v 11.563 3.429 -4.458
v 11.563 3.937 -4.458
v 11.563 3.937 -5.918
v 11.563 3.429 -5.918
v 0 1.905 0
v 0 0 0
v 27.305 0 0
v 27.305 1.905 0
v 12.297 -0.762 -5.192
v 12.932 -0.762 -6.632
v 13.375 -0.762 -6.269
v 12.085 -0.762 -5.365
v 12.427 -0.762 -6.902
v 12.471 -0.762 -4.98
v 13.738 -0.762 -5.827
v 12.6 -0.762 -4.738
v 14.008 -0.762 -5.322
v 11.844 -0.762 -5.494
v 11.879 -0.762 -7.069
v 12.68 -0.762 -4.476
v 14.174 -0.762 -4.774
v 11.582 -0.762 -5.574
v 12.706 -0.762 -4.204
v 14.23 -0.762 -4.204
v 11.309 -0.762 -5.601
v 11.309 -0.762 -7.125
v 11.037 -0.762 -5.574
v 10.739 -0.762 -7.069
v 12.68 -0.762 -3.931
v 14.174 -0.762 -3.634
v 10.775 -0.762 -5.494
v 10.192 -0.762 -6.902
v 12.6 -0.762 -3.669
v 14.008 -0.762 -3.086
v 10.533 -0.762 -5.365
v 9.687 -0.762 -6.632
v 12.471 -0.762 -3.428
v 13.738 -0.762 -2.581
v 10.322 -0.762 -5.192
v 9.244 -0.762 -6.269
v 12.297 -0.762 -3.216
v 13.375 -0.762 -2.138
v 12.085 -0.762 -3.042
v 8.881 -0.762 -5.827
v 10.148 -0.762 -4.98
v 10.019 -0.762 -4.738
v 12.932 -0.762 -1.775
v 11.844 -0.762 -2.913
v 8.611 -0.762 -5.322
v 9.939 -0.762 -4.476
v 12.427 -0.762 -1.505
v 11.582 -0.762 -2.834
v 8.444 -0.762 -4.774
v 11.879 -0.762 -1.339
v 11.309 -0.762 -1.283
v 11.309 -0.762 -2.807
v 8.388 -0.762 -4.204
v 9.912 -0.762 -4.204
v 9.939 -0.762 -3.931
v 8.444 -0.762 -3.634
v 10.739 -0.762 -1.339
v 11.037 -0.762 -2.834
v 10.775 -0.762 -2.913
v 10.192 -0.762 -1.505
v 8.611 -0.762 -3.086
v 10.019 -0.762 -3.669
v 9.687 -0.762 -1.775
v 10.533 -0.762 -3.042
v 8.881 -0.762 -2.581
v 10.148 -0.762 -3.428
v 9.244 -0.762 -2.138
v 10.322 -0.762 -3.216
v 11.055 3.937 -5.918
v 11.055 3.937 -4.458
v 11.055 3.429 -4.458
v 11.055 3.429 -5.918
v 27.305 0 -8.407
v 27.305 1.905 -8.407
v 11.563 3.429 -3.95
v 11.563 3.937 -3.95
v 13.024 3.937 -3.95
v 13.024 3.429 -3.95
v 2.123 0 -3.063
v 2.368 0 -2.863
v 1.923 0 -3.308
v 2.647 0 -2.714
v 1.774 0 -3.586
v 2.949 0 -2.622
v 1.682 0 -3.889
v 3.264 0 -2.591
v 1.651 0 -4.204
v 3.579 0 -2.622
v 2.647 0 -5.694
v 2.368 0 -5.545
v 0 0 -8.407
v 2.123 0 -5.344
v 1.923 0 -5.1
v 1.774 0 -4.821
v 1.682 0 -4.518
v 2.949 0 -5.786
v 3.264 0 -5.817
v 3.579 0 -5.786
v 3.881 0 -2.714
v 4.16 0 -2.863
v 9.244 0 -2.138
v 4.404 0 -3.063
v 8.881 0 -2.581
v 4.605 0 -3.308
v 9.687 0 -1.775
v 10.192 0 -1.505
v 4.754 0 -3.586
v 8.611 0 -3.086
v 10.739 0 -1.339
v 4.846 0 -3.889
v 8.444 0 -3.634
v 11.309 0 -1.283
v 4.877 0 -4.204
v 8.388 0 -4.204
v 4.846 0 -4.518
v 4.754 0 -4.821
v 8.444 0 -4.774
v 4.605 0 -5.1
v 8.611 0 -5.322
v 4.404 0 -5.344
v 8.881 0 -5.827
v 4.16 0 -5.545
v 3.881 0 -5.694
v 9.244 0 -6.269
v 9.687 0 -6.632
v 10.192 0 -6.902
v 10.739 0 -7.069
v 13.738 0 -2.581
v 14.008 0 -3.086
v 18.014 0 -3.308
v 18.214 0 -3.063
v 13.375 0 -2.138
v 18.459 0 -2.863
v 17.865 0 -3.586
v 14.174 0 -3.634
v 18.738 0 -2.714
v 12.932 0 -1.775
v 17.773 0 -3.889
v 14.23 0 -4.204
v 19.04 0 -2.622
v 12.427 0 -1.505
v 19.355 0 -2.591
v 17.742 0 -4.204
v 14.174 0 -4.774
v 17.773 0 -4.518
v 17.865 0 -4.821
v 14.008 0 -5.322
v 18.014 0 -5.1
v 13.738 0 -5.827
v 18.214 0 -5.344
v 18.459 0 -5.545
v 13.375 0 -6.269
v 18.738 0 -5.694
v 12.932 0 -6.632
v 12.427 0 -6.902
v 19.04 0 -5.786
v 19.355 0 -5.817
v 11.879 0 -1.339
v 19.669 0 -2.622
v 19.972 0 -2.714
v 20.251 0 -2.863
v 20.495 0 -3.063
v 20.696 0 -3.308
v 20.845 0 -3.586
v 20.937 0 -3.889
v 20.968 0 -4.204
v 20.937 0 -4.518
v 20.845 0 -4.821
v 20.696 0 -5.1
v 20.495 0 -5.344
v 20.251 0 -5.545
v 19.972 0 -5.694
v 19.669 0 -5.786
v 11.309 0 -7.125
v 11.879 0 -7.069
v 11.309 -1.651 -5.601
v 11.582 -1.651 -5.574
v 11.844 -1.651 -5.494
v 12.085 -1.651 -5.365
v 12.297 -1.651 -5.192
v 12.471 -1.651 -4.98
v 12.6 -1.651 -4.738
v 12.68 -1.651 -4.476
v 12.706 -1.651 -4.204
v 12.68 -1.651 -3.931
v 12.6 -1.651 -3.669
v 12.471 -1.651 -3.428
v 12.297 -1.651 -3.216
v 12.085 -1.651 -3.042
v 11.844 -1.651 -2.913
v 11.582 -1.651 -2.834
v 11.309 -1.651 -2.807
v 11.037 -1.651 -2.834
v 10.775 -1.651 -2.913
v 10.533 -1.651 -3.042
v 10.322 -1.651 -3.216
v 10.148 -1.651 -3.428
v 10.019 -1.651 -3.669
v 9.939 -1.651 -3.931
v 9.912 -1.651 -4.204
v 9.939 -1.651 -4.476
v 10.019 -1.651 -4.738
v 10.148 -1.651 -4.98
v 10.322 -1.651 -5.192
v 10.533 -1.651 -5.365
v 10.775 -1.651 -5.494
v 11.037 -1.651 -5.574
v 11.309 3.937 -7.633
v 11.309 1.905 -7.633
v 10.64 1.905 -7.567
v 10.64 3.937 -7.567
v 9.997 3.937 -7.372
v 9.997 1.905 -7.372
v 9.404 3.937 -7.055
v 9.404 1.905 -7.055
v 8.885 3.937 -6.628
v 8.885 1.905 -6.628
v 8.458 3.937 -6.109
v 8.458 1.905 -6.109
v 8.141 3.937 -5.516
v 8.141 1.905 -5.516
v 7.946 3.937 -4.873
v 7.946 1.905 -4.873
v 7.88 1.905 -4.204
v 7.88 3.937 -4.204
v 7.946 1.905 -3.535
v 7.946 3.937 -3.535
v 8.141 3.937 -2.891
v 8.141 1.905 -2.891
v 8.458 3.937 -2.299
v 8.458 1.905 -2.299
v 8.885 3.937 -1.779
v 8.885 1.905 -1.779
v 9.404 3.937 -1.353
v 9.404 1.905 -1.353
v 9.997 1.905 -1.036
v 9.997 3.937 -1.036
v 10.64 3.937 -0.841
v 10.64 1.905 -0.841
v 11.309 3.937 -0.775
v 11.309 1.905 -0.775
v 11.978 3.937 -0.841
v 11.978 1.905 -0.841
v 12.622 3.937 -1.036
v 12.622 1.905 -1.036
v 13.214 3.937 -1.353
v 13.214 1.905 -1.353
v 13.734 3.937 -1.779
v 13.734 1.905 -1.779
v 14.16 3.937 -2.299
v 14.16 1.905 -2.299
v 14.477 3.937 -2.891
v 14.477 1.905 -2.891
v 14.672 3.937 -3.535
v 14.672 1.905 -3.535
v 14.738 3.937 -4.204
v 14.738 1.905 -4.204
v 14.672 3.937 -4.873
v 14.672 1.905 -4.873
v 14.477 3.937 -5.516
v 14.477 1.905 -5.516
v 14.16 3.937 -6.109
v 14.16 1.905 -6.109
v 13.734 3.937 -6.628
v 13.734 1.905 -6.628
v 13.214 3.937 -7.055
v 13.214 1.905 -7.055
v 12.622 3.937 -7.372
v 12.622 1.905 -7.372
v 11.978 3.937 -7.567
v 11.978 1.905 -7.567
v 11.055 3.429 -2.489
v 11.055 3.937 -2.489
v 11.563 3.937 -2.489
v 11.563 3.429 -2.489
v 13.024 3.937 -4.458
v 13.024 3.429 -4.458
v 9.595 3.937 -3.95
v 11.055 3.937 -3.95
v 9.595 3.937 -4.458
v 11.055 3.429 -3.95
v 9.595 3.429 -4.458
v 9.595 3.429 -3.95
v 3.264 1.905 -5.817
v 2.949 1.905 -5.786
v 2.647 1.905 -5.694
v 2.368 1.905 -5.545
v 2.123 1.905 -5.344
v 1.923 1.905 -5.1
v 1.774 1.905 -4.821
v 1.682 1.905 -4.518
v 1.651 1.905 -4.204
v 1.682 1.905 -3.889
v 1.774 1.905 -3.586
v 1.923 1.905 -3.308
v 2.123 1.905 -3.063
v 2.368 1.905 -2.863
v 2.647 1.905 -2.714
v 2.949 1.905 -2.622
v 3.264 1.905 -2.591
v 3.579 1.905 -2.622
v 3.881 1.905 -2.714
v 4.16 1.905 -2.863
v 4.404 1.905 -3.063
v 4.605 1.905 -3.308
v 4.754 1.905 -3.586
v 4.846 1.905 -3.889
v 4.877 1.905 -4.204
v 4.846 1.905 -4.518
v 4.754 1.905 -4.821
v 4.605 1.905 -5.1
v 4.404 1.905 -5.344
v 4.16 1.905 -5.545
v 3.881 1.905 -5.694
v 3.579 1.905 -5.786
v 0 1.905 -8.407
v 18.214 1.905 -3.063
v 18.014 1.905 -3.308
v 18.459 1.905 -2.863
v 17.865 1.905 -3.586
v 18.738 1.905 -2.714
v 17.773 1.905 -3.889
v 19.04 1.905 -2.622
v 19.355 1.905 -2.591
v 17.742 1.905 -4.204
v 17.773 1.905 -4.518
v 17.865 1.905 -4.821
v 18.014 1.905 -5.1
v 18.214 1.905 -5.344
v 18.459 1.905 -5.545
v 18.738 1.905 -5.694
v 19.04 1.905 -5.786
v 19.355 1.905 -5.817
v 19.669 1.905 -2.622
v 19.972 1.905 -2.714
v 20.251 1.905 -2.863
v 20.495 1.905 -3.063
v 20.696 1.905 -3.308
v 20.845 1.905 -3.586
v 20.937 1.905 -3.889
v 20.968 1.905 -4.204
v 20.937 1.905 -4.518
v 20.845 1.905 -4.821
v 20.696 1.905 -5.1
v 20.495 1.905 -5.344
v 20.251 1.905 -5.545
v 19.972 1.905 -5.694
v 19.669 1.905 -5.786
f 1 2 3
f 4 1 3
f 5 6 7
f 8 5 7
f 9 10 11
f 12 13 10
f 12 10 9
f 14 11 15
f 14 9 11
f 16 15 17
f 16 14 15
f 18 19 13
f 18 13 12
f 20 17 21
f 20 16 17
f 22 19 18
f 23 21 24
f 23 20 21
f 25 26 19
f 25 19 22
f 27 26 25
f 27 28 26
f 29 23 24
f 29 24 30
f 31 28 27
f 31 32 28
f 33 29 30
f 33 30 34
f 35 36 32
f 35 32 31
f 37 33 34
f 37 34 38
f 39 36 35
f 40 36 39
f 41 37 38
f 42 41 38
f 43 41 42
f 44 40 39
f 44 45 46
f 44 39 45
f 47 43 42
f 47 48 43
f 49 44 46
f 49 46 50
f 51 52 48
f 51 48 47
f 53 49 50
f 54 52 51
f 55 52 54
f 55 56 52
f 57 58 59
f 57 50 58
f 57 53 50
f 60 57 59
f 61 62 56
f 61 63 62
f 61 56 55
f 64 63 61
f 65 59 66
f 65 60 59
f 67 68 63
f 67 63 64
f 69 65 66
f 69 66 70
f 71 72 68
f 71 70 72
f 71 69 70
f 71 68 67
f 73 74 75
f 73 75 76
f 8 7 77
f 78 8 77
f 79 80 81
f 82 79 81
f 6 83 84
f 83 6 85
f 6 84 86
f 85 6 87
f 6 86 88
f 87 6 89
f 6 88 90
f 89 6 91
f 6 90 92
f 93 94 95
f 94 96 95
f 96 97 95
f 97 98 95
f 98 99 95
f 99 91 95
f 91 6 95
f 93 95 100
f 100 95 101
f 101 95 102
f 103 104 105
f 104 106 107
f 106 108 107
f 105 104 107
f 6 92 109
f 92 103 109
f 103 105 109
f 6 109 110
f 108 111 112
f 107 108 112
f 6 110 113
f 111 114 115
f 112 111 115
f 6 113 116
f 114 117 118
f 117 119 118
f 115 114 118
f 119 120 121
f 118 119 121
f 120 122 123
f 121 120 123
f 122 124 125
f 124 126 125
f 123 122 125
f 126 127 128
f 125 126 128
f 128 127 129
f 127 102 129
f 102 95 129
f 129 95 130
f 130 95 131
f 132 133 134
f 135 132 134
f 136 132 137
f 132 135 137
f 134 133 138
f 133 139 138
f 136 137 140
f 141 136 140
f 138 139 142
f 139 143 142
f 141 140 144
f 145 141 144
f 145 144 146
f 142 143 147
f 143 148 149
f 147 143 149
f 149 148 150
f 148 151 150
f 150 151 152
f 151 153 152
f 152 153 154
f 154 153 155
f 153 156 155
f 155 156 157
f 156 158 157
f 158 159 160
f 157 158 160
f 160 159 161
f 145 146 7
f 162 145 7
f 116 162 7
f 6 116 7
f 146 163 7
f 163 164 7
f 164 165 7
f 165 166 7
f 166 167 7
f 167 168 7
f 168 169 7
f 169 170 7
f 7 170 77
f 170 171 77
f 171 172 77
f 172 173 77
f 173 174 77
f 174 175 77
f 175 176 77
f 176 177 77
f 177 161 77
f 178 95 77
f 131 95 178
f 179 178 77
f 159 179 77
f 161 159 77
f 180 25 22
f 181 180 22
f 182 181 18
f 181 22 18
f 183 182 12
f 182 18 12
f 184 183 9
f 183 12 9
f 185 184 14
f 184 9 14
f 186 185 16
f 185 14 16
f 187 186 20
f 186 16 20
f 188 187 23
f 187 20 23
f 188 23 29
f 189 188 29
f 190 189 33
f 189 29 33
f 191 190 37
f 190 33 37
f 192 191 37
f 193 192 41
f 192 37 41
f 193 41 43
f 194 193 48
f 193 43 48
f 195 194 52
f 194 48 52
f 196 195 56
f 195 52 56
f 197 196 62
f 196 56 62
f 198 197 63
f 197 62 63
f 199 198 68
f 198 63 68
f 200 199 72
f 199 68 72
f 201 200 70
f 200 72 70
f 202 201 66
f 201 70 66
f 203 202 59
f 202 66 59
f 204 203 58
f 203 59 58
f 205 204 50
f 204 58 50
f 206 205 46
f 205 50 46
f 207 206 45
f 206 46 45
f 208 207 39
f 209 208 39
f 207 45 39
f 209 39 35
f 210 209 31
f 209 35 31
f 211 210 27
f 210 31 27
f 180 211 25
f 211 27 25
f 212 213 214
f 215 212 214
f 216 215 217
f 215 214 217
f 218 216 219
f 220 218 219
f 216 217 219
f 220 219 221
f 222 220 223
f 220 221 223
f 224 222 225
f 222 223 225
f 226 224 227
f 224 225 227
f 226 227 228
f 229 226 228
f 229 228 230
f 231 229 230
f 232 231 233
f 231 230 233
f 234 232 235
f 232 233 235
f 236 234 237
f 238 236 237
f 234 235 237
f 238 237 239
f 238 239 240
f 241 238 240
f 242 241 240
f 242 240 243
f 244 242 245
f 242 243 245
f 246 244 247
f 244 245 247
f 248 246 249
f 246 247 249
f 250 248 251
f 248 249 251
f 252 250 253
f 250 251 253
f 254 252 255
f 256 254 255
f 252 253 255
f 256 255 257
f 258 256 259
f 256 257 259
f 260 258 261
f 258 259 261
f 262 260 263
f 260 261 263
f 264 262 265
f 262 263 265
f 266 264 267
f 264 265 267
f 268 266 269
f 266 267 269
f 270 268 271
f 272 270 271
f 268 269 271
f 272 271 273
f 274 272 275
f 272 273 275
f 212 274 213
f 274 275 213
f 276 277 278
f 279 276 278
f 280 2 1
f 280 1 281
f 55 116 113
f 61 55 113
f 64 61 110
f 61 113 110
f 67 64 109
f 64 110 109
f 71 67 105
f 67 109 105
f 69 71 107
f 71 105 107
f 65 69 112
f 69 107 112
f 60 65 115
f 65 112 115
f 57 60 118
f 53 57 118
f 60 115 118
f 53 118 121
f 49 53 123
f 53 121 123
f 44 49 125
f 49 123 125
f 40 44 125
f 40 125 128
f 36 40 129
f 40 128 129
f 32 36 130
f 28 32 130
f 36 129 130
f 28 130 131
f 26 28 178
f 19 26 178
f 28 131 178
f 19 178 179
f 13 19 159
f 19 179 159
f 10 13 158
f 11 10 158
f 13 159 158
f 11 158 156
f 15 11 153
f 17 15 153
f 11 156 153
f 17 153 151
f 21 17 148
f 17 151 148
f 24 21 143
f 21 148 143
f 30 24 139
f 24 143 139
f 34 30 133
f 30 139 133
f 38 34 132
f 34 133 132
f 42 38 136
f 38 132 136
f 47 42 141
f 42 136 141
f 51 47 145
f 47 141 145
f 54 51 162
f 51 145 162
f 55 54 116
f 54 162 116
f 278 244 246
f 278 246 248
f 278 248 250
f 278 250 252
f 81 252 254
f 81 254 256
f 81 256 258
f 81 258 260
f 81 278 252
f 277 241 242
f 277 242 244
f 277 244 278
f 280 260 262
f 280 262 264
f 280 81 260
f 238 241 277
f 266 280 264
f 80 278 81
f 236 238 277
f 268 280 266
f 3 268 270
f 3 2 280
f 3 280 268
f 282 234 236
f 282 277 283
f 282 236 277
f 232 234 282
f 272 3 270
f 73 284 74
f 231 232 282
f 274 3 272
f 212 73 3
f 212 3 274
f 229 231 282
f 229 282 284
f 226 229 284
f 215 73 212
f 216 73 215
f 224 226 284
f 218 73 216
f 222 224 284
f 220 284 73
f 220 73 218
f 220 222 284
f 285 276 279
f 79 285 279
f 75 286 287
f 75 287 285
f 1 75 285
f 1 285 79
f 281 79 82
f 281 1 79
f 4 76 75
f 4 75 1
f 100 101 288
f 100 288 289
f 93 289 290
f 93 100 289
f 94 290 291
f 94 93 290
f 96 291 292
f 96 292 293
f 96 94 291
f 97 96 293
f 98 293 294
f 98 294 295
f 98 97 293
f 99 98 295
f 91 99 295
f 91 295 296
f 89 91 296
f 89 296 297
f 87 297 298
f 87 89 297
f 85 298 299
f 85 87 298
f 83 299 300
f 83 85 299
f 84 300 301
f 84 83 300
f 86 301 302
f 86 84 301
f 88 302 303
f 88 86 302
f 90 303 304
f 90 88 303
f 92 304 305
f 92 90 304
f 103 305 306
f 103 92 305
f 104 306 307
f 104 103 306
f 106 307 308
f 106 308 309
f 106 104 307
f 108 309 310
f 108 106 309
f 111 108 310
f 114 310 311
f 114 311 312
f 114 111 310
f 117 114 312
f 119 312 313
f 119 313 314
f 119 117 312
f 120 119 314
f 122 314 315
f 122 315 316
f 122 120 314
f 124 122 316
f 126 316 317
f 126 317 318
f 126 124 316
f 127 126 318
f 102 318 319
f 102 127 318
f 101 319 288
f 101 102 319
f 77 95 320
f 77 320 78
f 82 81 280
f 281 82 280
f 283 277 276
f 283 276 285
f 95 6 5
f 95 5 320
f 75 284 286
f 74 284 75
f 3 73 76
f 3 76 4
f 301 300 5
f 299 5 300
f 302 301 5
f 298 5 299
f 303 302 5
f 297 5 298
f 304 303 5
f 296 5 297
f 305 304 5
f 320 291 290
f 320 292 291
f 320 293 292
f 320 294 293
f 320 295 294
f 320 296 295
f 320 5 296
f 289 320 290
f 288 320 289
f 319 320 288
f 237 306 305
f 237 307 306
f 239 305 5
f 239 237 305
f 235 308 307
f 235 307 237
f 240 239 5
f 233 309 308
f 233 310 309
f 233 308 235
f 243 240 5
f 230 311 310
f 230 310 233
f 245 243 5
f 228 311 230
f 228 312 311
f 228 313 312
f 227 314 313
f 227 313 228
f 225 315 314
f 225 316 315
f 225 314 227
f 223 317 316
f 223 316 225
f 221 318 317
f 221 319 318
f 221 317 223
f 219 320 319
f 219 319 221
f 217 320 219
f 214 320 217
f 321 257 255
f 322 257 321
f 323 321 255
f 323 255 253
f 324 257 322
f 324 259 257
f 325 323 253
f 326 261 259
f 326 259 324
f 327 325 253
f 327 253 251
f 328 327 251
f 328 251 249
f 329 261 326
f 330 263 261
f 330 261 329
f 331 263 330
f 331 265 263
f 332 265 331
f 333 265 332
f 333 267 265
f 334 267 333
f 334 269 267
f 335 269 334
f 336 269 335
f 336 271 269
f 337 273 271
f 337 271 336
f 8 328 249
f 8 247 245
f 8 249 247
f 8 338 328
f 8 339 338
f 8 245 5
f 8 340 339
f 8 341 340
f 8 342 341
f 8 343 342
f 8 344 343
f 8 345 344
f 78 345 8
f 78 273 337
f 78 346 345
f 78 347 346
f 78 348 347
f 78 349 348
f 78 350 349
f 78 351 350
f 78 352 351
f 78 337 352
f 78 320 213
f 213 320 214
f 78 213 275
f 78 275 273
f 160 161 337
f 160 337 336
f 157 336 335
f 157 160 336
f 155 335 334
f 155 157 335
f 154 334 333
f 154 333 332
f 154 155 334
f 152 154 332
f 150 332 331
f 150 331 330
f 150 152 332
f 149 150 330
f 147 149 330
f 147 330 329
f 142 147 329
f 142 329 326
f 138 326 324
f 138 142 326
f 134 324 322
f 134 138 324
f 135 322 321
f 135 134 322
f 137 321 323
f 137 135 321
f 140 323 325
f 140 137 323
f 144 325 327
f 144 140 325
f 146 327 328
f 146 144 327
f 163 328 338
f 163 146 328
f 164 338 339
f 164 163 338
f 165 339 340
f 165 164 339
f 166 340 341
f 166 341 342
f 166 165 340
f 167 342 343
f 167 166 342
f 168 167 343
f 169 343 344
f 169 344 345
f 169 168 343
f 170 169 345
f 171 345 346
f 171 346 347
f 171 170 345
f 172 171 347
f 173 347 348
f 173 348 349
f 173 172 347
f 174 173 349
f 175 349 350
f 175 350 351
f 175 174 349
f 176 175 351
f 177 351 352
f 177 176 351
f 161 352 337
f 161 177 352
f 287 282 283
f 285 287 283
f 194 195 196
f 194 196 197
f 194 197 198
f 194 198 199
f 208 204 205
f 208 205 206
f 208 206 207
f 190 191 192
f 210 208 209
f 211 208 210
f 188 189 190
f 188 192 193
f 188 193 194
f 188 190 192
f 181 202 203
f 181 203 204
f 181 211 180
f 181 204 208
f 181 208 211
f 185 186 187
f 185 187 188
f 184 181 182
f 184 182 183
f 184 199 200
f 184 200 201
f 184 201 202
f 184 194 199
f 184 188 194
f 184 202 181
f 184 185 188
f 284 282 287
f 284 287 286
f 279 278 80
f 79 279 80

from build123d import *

# Parameters (mm, degrees)
SKETCH1_W                    = 27.305
SKETCH1_H                    = 8.4074
SKETCH1_R                    = 1.6129
BASE_PCB_DEPTH               = 1.905
SKETCH2_R                    = 3.429
SCREW_HEAD_UNSCREWED_DEPTH   = 2.032
SKETCH3_R                    = 2.921
THREADED_HOLE_BOSS_DEPTH     = 0.762
SKETCH4_R                    = 1.397
SCREW_STICKOUT_SCREWED_DEPTH = 0.889
SKETCH5_W                    = 0.508
SKETCH5_H                    = 1.4605
SKETCH5_W_2                  = 1.4605
SKETCH5_H_2                  = 0.508
F_2S_LIPO_MOUNTING_DEPTH     = 0.508


with BuildPart() as part:
    # Sketch1 → Base PCB (new body)
    with BuildSketch(Plane(origin=(0, 0, 0), x_dir=(1, 0, 0), z_dir=(0, 1, 0))):
        with Locations((13.6525, 4.2037)):
            Rectangle(SKETCH1_W, SKETCH1_H)
        with Locations(Location((3.2639, 4.2037, 0), (0, 0, 90))):
            Circle(SKETCH1_R, mode=Mode.SUBTRACT)
        with Locations(Location((19.3548, 4.2037, 0), (0, 0, 90))):
            Circle(SKETCH1_R, mode=Mode.SUBTRACT)
    extrude(amount=BASE_PCB_DEPTH)

    # Sketch2 → Screw Head (Unscrewed) (add)
    with BuildSketch(Plane(origin=(0, 1.905, 0), x_dir=(1, 0, 0), z_dir=(0, 1, 0))):
        with Locations(Location((11.30935, 4.2037, 0), (0, 0, 90))):
            Circle(SKETCH2_R)
    extrude(amount=SCREW_HEAD_UNSCREWED_DEPTH)

    # Sketch3 → Threaded Hole Boss (add)
    with BuildSketch(Plane.XZ):
        with Locations(Location((11.30935, -4.2037, 0), (0, 0, 90))):
            Circle(SKETCH3_R)
    extrude(amount=THREADED_HOLE_BOSS_DEPTH)

    # Sketch4 → Screw Stickout (Screwed) (add)
    with BuildSketch(Plane.XZ.offset(0.762)):
        with Locations(Location((11.30935, -4.2037, 0), (0, 0, 270))):
            Circle(SKETCH4_R)
    extrude(amount=SCREW_STICKOUT_SCREWED_DEPTH)

    # Sketch5 → 2s LiPo Mounting (cut)
    with BuildSketch(Plane(origin=(0, 3.937, 0), x_dir=(1, 0, 0), z_dir=(0, 1, 0))):
        with Locations((11.30935, 5.18795)):
            Rectangle(SKETCH5_W, SKETCH5_H)
        with Locations((10.3251, 4.2037)):
            Rectangle(SKETCH5_W_2, SKETCH5_H_2)
        with Locations((11.30935, 4.2037)):
            Rectangle(SKETCH5_W, SKETCH5_H_2)
        with Locations((11.30935, 3.21945)):
            Rectangle(SKETCH5_W, SKETCH5_H)
        with Locations((12.2936, 4.2037)):
            Rectangle(SKETCH5_W_2, SKETCH5_H_2)
    extrude(amount=-F_2S_LIPO_MOUNTING_DEPTH, mode=Mode.SUBTRACT)


solid = part.part
